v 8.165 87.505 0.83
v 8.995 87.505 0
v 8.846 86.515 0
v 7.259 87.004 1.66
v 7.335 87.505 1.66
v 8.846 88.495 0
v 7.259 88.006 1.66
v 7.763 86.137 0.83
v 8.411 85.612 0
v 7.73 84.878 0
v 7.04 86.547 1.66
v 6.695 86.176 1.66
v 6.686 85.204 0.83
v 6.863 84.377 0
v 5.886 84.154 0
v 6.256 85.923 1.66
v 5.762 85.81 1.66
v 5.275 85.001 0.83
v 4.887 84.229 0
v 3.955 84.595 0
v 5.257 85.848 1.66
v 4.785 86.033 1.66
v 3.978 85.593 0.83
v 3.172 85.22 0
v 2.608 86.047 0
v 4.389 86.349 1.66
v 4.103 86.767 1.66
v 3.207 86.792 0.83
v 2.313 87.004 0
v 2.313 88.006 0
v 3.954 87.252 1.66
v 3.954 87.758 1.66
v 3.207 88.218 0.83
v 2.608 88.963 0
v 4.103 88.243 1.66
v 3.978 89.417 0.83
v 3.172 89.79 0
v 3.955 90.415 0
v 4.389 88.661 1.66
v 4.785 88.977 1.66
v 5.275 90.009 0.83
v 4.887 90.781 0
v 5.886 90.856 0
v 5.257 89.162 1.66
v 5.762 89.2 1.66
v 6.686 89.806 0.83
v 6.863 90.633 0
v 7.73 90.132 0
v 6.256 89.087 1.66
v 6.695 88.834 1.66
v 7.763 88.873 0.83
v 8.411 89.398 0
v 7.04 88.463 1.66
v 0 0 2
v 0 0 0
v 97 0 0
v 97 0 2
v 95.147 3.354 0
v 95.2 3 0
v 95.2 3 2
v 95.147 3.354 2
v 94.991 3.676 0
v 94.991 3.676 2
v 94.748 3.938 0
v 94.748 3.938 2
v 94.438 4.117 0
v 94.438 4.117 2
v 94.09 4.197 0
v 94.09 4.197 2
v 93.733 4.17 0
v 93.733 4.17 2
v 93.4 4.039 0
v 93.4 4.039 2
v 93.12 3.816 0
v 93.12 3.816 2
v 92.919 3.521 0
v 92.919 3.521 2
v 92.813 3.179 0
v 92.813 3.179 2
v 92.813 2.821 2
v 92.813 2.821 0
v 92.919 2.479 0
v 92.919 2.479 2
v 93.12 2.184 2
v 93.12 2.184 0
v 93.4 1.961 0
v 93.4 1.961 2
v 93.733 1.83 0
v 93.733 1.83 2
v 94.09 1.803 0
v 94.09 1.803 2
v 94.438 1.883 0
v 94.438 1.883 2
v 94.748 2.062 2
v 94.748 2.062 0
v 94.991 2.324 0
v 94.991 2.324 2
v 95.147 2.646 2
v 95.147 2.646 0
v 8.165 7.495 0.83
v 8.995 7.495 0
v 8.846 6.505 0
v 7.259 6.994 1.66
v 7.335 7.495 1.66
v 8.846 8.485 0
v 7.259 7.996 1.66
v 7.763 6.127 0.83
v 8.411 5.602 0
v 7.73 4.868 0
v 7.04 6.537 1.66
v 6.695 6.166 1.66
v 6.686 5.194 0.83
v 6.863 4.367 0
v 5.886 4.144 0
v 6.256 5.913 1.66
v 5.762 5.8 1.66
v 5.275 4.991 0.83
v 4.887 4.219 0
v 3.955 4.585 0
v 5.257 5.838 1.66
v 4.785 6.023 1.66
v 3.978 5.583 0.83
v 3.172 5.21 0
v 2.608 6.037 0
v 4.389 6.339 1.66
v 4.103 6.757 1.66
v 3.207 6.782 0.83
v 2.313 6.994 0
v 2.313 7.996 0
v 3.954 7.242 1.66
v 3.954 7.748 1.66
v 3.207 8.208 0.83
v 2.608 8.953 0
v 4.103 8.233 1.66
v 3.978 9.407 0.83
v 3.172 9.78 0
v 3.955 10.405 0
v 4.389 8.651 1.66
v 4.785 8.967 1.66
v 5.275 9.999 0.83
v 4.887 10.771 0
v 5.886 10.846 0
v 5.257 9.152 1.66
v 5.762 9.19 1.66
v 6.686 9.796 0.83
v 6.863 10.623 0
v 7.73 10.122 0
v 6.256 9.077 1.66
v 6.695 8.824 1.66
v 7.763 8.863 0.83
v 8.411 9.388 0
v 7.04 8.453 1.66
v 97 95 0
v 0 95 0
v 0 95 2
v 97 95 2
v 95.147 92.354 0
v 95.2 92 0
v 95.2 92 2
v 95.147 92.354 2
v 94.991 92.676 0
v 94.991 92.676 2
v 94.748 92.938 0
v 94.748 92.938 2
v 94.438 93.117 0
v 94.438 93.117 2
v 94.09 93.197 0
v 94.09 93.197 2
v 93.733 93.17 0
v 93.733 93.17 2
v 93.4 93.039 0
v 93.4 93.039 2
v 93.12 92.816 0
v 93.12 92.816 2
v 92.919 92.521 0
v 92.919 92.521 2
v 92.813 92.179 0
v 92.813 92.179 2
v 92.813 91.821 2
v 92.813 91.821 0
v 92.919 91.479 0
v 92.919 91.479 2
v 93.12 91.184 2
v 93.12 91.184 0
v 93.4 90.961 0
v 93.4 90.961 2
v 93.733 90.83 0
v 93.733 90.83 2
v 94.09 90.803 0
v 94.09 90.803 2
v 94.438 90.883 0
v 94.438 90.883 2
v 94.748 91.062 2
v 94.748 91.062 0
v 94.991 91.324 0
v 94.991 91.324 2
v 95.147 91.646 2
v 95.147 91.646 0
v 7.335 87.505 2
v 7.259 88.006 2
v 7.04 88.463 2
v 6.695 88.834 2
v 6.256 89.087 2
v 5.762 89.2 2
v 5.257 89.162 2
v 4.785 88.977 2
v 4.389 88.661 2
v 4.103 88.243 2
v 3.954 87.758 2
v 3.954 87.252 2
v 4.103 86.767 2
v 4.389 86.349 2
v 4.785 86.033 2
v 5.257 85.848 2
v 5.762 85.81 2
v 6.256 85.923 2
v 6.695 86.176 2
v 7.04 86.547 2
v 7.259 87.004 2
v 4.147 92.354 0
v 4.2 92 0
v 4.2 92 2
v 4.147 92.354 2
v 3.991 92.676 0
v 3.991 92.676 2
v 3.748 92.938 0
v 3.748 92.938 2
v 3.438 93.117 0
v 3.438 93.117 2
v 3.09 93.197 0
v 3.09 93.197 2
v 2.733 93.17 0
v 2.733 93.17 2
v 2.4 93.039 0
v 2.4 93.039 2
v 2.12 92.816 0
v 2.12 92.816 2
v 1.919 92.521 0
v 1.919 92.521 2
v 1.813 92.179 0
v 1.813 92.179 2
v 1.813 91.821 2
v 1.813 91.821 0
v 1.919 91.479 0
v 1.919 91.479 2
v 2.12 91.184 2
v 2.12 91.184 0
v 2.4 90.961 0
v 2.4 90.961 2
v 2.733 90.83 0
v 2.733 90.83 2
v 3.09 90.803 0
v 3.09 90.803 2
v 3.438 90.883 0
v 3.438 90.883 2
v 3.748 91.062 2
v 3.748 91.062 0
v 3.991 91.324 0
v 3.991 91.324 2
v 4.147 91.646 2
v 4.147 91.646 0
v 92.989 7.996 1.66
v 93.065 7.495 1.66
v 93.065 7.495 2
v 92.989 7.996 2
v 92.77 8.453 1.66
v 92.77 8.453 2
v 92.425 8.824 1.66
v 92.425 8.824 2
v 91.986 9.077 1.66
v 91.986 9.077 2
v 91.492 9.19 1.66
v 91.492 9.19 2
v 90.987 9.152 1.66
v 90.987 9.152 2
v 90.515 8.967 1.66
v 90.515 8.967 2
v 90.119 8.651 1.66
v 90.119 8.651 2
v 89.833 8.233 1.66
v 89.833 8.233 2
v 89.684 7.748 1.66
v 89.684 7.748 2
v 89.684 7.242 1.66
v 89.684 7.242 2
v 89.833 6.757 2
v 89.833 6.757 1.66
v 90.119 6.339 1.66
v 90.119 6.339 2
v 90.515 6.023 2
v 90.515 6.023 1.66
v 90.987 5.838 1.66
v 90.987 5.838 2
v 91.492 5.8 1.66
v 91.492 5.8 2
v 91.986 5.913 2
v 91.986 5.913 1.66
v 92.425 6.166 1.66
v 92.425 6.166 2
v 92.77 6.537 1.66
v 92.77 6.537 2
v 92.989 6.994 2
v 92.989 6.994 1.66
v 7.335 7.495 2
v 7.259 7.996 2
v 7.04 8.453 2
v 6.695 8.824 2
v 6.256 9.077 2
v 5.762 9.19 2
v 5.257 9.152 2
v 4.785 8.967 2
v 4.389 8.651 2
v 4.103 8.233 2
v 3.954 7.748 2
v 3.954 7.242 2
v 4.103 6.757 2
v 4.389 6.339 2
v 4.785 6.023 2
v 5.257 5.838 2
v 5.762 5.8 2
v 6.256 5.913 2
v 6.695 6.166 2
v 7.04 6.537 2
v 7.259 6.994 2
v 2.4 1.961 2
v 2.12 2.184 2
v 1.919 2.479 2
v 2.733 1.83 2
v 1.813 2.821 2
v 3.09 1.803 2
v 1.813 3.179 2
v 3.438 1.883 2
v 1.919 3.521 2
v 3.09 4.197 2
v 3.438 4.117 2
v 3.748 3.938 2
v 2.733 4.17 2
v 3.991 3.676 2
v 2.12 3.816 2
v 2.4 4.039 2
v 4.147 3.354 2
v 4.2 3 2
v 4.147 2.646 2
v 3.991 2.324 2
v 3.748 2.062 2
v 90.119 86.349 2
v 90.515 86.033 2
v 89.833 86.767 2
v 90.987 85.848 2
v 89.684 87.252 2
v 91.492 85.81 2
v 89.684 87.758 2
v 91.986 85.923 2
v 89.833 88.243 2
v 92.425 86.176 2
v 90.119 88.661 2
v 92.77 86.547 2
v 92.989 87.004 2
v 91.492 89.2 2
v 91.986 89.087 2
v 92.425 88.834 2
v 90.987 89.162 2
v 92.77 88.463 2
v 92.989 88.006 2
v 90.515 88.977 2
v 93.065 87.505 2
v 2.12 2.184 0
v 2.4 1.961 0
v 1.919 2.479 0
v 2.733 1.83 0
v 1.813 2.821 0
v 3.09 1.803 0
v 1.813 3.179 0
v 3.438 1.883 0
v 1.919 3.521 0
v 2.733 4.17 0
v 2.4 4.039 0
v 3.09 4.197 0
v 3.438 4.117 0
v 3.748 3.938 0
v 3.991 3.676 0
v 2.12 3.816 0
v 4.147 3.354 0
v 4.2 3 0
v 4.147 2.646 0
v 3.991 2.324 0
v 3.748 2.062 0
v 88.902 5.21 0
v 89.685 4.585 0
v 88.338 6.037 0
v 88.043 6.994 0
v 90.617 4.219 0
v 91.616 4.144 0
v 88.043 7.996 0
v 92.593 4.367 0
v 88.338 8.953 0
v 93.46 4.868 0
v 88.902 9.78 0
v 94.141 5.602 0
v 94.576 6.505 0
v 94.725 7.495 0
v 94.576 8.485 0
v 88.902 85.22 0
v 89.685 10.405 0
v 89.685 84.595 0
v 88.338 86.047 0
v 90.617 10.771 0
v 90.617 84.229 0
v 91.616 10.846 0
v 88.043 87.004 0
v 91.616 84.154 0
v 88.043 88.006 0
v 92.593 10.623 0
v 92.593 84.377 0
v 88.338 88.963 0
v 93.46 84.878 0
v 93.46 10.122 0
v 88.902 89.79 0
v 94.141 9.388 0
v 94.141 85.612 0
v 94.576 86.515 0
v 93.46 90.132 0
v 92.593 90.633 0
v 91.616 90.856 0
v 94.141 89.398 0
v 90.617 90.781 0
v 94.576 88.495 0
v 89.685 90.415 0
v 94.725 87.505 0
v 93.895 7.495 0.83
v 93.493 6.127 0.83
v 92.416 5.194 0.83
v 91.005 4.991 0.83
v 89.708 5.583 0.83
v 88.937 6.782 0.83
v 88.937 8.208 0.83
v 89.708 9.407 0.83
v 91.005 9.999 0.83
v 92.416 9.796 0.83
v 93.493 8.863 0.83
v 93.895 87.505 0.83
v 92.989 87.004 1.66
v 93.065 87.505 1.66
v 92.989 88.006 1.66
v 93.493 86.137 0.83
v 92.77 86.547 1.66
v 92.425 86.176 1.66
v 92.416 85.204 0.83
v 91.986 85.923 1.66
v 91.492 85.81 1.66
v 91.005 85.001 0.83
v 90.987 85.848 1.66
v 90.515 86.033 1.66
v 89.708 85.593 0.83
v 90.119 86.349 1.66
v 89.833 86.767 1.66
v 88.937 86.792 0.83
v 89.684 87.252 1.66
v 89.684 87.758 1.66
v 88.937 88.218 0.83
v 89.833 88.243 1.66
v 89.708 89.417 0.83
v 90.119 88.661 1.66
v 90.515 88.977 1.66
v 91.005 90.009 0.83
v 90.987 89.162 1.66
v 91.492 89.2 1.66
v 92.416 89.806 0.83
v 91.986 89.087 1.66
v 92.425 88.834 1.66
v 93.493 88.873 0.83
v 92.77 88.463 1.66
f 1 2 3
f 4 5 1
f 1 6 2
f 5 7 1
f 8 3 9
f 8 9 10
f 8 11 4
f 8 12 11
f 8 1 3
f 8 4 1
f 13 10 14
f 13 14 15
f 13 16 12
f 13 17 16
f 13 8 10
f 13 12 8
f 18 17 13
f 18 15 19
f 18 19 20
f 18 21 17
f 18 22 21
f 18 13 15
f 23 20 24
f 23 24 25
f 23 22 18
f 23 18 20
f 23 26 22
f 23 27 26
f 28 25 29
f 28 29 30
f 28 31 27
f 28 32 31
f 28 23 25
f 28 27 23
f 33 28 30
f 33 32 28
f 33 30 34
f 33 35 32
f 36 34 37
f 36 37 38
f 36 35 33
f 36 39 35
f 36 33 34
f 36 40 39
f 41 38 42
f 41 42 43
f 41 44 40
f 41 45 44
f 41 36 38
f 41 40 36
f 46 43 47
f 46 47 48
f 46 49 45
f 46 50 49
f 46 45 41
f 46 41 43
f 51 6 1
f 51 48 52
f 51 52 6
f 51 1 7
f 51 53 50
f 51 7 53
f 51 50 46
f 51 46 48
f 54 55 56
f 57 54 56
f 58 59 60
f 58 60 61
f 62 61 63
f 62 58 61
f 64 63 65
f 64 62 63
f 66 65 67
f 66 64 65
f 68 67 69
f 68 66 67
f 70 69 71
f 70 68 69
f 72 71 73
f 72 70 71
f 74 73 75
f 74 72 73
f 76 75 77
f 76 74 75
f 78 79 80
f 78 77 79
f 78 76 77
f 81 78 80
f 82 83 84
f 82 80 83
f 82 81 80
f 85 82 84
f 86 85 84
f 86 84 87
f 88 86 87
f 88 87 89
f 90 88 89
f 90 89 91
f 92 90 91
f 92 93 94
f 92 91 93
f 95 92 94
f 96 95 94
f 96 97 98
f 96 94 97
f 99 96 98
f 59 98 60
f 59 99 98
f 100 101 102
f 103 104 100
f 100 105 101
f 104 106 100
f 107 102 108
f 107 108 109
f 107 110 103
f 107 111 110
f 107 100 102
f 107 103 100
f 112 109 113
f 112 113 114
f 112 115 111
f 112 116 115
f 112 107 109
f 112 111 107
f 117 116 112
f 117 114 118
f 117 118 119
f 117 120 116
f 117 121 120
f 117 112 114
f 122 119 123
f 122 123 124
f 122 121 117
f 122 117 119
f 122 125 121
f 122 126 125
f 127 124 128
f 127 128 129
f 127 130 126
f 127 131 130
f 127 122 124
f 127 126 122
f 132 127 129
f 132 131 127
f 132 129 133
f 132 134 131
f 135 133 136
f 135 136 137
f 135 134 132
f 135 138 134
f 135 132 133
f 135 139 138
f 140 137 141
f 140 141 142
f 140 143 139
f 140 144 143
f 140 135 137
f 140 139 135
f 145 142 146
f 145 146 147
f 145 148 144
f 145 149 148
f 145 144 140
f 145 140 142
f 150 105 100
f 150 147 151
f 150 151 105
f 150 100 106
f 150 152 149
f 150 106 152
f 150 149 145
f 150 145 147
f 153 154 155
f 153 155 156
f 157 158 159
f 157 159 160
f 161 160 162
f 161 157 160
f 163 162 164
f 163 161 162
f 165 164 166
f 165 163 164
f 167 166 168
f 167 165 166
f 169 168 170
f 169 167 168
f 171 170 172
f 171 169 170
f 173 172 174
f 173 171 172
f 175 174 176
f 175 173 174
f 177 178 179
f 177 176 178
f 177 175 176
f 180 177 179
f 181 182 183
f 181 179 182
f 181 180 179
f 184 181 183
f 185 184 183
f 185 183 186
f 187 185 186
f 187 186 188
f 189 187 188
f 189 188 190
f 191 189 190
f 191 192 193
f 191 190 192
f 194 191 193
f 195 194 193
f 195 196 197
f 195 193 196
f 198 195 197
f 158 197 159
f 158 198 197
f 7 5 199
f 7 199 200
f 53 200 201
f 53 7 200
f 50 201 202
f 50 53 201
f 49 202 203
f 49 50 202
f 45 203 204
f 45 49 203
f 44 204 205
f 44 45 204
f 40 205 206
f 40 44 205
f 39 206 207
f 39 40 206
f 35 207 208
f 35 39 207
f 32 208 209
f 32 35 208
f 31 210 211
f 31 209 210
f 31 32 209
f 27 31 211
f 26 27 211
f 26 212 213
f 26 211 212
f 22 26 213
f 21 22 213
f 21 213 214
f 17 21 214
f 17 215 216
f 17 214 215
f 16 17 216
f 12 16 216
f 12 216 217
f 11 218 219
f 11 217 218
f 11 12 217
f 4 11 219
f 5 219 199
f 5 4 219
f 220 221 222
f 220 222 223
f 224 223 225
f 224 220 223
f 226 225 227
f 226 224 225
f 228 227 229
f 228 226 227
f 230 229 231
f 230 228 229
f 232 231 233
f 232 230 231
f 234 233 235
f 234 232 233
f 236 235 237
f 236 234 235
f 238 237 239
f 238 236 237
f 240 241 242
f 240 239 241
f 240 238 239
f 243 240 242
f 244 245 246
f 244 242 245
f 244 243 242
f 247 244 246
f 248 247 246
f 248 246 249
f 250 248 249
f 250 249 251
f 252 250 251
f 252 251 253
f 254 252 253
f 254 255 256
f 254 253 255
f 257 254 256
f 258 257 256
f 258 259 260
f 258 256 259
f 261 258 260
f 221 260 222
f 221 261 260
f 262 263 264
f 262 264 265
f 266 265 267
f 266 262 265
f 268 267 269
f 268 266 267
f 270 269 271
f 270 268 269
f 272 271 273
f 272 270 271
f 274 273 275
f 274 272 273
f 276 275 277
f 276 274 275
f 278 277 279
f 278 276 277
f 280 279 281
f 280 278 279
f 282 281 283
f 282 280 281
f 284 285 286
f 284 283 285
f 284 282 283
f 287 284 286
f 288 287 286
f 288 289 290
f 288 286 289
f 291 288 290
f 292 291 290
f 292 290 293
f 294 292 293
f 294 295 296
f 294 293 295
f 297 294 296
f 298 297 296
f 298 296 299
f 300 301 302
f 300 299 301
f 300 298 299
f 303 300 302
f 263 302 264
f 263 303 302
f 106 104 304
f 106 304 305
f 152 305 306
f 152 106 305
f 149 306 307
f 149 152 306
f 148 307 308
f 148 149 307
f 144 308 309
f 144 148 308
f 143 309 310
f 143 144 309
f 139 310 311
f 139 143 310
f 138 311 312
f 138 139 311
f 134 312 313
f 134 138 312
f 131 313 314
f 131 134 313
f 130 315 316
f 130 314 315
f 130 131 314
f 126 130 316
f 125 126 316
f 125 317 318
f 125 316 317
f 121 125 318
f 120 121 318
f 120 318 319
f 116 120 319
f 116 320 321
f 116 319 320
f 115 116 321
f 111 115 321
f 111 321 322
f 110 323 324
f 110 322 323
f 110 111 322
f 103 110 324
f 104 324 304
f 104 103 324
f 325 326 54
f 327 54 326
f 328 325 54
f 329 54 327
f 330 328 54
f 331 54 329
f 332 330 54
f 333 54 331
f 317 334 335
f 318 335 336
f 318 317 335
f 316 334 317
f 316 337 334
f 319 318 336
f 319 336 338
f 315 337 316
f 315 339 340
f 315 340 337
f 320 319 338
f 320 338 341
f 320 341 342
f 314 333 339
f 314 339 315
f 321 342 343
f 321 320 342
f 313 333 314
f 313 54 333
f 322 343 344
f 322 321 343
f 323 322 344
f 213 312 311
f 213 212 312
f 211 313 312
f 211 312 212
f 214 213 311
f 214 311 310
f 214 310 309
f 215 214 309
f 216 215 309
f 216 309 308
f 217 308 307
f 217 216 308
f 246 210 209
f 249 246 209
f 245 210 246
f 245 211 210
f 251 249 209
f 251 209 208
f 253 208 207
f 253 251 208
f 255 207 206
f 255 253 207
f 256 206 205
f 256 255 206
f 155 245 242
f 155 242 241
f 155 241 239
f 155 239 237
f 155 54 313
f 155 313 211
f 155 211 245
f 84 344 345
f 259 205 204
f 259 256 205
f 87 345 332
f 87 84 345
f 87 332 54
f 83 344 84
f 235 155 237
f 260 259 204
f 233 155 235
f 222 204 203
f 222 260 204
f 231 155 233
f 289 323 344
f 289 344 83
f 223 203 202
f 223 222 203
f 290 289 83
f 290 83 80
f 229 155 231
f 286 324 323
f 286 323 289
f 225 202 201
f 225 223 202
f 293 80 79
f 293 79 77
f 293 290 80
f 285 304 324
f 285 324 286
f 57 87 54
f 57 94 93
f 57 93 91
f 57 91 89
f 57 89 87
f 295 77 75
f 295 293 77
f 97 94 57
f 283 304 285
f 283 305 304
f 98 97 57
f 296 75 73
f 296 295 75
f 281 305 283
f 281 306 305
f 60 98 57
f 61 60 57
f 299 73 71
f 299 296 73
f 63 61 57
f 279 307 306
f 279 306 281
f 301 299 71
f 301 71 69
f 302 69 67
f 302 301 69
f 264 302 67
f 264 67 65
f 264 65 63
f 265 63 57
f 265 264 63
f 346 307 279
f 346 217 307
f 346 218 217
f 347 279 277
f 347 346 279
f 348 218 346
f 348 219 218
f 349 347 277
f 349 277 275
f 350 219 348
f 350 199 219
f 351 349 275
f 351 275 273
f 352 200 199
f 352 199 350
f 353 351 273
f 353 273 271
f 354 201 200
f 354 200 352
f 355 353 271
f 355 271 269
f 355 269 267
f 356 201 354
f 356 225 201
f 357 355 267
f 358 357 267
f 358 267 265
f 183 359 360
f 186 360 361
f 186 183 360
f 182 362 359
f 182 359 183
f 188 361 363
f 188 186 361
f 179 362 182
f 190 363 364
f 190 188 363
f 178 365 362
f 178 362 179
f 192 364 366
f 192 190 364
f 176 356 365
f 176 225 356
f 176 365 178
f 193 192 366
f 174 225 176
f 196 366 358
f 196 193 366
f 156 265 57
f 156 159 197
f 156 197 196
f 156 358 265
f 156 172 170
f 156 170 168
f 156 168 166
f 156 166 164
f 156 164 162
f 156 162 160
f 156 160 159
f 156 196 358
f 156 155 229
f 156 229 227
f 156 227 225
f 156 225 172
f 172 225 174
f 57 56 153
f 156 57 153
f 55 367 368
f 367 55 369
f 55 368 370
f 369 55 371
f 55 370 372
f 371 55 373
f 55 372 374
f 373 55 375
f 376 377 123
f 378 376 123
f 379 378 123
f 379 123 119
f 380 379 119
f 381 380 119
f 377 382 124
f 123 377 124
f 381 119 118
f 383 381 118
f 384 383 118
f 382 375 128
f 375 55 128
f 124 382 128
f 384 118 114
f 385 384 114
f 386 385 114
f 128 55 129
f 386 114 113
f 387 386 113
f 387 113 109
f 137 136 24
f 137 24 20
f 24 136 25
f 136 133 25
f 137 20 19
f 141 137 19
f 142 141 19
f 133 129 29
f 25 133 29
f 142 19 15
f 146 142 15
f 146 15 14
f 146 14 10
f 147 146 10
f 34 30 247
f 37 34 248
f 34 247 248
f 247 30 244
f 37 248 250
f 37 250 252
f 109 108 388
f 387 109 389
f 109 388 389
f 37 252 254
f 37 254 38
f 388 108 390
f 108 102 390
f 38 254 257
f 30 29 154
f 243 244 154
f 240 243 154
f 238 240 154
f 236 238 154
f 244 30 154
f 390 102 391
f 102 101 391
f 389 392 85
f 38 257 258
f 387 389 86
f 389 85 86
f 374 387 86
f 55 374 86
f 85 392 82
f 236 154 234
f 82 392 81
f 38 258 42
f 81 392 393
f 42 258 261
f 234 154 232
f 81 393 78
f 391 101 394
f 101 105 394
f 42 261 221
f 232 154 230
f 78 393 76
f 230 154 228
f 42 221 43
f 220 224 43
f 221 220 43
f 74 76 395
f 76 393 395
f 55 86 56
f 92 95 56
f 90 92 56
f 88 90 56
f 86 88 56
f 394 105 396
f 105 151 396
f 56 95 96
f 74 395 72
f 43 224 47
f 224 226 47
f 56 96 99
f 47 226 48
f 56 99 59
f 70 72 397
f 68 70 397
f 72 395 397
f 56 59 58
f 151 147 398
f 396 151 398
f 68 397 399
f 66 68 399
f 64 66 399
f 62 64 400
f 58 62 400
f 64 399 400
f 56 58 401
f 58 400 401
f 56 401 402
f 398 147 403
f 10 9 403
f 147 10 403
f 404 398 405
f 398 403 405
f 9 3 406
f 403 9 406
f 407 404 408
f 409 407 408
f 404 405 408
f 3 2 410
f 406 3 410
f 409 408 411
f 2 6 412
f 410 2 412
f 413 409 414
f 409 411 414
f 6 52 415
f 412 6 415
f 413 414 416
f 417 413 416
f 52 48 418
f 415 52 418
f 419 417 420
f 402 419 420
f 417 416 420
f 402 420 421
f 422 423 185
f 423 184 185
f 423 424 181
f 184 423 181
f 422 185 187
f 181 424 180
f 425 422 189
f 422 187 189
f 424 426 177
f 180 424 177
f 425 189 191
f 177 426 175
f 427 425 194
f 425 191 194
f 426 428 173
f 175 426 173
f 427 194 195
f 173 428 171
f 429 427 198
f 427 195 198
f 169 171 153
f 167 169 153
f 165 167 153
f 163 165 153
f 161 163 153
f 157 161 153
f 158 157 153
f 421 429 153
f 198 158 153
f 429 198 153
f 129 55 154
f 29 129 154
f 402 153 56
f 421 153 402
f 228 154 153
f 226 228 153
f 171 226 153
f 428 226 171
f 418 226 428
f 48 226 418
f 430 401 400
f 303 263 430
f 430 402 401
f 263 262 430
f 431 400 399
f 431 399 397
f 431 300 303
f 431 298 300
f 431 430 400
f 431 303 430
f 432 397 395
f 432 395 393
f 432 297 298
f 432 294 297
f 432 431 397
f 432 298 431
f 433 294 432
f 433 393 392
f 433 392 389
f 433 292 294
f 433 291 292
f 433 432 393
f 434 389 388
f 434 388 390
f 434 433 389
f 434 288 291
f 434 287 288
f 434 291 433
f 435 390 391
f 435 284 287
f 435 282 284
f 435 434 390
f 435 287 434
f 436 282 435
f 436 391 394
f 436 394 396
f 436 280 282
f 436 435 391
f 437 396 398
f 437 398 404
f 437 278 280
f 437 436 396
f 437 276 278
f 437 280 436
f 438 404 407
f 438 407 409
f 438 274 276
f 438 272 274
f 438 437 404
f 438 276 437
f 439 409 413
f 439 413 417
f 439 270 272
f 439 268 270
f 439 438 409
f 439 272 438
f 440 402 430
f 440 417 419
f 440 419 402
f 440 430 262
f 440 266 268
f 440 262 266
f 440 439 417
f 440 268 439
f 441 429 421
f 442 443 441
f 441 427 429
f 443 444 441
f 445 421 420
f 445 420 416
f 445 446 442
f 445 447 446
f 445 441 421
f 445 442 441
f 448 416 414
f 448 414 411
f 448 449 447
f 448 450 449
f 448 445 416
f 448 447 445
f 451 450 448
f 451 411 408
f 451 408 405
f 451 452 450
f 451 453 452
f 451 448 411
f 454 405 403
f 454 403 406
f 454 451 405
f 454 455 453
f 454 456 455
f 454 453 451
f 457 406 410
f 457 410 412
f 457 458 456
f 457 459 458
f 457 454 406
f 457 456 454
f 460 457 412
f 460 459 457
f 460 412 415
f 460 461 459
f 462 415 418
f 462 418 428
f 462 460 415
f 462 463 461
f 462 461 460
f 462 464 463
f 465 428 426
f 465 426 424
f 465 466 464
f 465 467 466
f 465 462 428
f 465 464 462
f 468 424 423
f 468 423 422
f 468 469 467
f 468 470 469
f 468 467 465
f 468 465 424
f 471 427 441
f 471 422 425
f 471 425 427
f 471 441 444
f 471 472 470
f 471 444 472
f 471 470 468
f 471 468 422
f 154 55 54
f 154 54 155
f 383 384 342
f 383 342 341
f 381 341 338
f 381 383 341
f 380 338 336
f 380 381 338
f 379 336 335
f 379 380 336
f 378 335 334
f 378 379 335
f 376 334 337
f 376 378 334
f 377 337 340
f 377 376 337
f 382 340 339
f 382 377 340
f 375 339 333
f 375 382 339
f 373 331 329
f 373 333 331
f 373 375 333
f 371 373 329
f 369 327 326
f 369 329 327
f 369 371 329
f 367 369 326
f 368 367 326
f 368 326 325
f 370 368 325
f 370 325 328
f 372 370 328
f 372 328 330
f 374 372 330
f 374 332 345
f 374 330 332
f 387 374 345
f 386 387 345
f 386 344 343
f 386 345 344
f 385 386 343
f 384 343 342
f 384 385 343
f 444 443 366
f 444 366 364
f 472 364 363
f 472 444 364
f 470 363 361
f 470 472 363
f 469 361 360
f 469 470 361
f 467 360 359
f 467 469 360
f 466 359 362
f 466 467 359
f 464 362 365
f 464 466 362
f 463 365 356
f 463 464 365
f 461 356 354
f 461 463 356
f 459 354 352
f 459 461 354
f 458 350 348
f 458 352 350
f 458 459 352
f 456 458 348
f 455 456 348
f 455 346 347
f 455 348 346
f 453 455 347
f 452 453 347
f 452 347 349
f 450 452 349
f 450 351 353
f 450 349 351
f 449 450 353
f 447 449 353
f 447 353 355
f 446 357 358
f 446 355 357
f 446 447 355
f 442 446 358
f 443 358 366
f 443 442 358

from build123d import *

# Parameters (mm, degrees)
PLATE_SKETCH_W                 = 97
PLATE_SKETCH_H                 = 95
PLATE_DEPTH                    = 2
M2_FOOT_SCREW_HOLES_DEPTH      = 136.786597277
M2_FOOT_SCREW_HOLES_DEPTH_BACK = 136.786597277
M2_FOOT_SCREW_HOLES_SKETCH_R   = 1.2
M3_STACK_ROD_HOLES_DEPTH       = 136.786597277
M3_STACK_ROD_HOLES_DEPTH_BACK  = 136.786597277
M3_STACK_ROD_HOLES_SKETCH_R    = 1.7
M3_COUNTERSINKS_SIZE           = 1.66


with BuildPart() as part:
    # Plate sketch → Plate (new body)
    with BuildSketch(Plane.XY):
        with Locations((48.5, 47.5)):
            Rectangle(PLATE_SKETCH_W, PLATE_SKETCH_H)
    extrude(amount=PLATE_DEPTH)

    # M2 foot screw holes sketch → M2 foot screw holes (cut, two sides: drawn at the far end of the back side and taken through both)
    with BuildSketch(Plane.XY.offset(-M2_FOOT_SCREW_HOLES_DEPTH_BACK)):
        with Locations((3, 3)):
            Circle(M2_FOOT_SCREW_HOLES_SKETCH_R)
        with Locations((94, 3)):
            Circle(M2_FOOT_SCREW_HOLES_SKETCH_R)
        with Locations((3, 92)):
            Circle(M2_FOOT_SCREW_HOLES_SKETCH_R)
        with Locations((94, 92)):
            Circle(M2_FOOT_SCREW_HOLES_SKETCH_R)
    extrude(amount=M2_FOOT_SCREW_HOLES_DEPTH + M2_FOOT_SCREW_HOLES_DEPTH_BACK, mode=Mode.SUBTRACT)

    # M3 stack rod holes sketch → M3 stack rod holes (cut, two sides: drawn at the far end of the back side and taken through both)
    with BuildSketch(Plane.XY.offset(-M3_STACK_ROD_HOLES_DEPTH_BACK)):
        with Locations((5.635, 7.495)):
            Circle(M3_STACK_ROD_HOLES_SKETCH_R)
        with Locations((91.365, 7.495)):
            Circle(M3_STACK_ROD_HOLES_SKETCH_R)
        with Locations((5.635, 87.505)):
            Circle(M3_STACK_ROD_HOLES_SKETCH_R)
        with Locations((91.365, 87.505)):
            Circle(M3_STACK_ROD_HOLES_SKETCH_R)
    extrude(amount=M3_STACK_ROD_HOLES_DEPTH + M3_STACK_ROD_HOLES_DEPTH_BACK, mode=Mode.SUBTRACT)

    # M3 countersinks
    m3_countersinks_edges = [part.edges().sort_by_distance(p)[0] for p in [
        (89.665, 7.495, 0),
        (3.935, 87.505, 0),
        (89.665, 87.505, 0),
        (3.935, 7.495, 0),
    ]]
    chamfer(m3_countersinks_edges, length=M3_COUNTERSINKS_SIZE)


solid = part.part
